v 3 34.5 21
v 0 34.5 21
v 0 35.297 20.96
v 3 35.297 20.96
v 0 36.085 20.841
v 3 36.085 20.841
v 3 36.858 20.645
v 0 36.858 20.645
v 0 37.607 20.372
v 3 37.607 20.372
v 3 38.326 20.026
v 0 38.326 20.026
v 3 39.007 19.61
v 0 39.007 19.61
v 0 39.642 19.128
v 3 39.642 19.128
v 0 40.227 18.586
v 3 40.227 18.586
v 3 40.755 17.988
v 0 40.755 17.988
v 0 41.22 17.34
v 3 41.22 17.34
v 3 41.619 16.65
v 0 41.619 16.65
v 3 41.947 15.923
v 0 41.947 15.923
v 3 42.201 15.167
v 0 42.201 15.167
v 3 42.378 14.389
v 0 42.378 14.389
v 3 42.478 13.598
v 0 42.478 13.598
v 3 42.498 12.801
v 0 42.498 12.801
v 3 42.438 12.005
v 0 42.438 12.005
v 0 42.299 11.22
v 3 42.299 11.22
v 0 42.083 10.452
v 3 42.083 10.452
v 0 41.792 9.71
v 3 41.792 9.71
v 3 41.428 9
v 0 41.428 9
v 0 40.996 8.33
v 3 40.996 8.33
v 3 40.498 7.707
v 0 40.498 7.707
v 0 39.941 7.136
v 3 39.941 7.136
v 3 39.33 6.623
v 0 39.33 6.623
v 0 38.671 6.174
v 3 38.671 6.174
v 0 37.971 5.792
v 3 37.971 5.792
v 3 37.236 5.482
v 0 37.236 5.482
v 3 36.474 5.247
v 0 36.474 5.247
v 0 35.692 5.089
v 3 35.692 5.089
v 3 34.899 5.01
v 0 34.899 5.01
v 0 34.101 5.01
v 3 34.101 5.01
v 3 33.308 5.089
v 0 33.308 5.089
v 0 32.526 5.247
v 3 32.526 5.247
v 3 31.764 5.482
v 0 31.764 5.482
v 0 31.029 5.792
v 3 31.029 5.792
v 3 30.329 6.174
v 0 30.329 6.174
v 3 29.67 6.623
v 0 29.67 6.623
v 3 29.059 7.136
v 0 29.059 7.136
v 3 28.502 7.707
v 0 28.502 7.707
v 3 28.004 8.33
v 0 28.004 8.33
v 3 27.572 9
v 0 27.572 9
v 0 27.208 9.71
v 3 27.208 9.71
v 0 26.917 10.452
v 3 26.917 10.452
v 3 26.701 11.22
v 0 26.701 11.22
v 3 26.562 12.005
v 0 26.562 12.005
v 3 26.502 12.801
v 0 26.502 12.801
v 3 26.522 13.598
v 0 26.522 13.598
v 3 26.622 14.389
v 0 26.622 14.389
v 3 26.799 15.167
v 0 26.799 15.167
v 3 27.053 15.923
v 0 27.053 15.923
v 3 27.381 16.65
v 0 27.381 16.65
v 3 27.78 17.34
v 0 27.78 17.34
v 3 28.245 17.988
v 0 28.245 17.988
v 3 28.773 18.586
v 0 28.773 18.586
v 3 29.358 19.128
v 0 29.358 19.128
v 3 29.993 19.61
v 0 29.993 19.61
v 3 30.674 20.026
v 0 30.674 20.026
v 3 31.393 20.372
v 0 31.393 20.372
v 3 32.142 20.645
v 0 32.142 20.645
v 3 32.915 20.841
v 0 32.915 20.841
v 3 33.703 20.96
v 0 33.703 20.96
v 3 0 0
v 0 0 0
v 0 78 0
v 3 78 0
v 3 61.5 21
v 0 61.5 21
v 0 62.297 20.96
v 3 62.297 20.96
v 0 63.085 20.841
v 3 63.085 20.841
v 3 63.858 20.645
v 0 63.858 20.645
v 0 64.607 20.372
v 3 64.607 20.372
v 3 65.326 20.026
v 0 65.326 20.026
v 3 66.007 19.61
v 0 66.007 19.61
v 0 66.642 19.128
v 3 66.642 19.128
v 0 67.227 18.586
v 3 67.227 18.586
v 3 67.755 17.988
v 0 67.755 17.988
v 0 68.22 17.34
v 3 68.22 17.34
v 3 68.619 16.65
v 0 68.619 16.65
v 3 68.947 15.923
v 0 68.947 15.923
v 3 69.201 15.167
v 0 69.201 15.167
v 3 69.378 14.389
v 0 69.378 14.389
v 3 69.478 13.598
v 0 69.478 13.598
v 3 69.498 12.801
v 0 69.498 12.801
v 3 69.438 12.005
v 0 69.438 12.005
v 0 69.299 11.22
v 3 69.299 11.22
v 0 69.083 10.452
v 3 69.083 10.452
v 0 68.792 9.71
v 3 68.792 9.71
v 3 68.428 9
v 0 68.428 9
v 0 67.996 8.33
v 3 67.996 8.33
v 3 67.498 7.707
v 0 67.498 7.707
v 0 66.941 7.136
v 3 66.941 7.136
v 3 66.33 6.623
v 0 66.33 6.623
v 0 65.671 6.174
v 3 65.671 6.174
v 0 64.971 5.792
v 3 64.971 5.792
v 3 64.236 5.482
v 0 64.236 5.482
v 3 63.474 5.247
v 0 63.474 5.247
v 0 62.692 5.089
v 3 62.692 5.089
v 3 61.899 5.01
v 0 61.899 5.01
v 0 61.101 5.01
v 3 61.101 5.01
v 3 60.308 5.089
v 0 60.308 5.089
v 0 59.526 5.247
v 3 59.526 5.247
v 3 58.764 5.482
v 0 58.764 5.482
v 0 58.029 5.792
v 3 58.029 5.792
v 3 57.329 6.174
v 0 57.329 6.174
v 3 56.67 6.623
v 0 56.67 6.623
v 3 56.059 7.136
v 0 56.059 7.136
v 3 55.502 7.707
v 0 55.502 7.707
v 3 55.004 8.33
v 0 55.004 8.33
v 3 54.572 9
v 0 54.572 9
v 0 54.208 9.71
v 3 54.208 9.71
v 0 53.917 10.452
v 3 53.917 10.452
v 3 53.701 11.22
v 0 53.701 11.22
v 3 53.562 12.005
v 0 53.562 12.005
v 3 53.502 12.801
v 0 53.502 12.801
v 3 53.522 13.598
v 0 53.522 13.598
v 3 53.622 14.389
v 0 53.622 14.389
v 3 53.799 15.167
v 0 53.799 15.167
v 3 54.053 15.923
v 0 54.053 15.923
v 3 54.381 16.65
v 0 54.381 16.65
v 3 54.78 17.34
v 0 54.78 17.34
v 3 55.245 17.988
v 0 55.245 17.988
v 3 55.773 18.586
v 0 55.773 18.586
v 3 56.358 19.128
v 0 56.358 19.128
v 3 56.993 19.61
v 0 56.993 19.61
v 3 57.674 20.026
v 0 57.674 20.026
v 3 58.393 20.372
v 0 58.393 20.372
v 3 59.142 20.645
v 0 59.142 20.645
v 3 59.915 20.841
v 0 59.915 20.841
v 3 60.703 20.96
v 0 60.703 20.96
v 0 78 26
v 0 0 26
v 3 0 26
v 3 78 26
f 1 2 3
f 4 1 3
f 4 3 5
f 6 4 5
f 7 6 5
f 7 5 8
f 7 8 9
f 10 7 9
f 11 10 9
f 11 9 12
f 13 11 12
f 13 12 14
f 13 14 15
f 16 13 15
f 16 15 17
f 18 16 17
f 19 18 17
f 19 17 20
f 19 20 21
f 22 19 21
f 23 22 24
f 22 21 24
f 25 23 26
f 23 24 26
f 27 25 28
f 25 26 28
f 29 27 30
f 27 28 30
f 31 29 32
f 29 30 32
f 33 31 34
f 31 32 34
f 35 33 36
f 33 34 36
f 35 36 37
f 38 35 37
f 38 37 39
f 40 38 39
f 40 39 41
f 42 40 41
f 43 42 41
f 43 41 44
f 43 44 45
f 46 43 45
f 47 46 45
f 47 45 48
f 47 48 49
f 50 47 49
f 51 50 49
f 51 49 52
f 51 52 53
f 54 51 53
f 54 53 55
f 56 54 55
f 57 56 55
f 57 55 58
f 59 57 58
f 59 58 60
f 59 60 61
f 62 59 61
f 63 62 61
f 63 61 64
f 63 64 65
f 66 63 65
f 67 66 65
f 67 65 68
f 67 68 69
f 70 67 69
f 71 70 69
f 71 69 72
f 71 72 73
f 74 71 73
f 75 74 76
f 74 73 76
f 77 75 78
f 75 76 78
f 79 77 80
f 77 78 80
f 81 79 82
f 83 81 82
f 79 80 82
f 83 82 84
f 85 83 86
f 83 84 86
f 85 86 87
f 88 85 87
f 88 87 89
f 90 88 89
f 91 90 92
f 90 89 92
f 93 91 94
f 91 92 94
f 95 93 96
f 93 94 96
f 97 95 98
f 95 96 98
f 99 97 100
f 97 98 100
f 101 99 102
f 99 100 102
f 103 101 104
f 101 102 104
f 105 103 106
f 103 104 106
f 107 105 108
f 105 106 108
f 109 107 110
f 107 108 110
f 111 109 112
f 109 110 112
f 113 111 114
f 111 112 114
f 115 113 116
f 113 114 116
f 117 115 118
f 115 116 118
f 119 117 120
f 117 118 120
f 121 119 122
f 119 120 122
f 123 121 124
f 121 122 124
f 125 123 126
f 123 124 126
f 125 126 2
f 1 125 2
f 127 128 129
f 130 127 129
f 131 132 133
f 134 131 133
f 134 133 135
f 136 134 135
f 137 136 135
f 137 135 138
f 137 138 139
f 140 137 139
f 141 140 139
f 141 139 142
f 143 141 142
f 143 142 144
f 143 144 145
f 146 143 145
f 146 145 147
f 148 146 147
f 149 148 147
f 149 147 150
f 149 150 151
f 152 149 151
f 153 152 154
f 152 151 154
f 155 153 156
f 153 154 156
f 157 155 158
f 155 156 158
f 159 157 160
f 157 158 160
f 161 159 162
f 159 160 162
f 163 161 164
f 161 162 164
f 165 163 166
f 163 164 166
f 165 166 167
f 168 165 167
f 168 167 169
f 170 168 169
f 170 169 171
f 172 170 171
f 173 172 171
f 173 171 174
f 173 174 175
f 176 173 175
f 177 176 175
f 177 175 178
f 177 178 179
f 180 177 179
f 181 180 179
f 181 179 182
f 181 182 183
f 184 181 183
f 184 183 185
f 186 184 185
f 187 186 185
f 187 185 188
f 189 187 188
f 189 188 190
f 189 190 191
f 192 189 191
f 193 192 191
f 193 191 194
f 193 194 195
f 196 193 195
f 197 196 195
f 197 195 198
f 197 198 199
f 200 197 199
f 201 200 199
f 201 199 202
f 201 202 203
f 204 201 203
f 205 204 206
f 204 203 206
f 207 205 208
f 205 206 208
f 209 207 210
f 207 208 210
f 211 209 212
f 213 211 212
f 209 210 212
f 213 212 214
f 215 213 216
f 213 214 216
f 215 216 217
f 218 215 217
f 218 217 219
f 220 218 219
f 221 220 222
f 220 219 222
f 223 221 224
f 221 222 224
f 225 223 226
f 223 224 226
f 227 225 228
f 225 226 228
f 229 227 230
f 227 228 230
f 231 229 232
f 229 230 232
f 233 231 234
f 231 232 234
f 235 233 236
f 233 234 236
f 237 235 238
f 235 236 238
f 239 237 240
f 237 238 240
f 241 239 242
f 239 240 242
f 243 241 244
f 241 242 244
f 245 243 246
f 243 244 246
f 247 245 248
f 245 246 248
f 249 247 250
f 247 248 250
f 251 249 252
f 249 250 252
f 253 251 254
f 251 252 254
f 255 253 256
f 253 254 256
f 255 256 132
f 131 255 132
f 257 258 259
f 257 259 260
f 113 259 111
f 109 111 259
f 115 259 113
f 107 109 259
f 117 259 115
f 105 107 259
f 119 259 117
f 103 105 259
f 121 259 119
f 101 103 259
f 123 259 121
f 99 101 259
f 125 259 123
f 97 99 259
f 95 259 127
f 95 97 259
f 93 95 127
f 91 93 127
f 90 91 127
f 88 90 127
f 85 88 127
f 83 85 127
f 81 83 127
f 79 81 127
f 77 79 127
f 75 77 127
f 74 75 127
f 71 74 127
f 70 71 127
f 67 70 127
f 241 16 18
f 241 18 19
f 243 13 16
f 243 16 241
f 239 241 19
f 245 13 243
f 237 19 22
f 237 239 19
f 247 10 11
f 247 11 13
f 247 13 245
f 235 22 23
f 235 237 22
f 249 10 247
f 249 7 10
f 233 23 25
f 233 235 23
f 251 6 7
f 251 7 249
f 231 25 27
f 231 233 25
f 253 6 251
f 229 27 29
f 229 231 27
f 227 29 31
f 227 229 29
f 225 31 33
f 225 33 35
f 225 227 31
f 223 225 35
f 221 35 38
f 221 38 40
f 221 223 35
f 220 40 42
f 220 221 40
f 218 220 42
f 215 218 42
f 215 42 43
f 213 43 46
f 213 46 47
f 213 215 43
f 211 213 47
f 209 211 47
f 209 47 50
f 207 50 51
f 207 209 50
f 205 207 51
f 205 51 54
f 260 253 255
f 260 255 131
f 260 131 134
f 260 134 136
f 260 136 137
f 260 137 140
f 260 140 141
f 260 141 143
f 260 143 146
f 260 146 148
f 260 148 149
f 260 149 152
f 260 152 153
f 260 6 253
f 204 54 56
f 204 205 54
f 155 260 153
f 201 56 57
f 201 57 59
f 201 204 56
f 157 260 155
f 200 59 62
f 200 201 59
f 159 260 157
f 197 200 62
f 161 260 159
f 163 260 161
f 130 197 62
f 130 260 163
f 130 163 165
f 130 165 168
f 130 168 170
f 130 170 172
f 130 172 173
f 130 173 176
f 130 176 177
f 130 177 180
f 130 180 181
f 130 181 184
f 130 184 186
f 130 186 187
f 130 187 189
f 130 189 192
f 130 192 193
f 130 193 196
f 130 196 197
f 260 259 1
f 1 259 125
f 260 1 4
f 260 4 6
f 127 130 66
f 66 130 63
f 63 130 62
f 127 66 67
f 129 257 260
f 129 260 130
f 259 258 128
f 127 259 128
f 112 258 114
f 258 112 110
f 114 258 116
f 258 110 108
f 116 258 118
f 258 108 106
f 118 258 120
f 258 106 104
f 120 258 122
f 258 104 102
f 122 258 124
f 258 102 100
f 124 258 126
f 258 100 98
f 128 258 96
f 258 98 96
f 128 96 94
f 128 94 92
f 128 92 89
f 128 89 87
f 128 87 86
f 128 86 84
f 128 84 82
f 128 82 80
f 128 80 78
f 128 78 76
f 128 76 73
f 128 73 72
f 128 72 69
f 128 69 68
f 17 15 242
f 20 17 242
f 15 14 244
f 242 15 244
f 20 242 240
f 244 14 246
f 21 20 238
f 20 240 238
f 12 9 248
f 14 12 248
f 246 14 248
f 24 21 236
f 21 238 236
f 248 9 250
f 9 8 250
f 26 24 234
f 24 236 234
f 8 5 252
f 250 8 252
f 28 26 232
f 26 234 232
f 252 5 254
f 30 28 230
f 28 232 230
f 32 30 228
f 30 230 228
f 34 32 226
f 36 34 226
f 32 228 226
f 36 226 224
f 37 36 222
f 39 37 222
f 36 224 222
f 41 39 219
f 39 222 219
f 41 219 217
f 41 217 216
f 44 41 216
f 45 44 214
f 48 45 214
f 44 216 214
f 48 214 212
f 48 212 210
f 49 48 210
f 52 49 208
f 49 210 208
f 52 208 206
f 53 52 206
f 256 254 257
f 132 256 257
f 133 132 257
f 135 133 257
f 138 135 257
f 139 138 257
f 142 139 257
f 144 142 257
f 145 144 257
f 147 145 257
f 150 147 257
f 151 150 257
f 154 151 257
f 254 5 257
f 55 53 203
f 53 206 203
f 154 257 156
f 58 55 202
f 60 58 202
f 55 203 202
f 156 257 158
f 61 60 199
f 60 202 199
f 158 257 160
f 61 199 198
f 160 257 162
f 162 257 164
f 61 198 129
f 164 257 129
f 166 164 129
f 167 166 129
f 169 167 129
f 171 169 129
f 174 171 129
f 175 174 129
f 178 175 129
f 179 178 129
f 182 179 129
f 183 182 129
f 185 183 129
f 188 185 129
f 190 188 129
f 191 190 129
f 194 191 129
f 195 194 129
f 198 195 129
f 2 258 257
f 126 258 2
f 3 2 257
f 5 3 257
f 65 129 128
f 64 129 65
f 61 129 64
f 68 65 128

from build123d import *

# Parameters (mm, degrees)
CROQUIS1_W              = 26
CROQUIS1_H              = 78
SALIENTE_EXTRUIR1_DEPTH = 3
CROQUIS2_R              = 8
CORTAR_EXTRUIR1_DEPTH   = 4


with BuildPart() as part:
    # Croquis1 → Saliente-Extruir1 (new body)
    with BuildSketch(Plane(origin=(0, 0, 0), x_dir=(0, 0, -1), z_dir=(1, 0, 0))):
        with Locations((-13, 39)):
            Rectangle(CROQUIS1_W, CROQUIS1_H)
    extrude(amount=SALIENTE_EXTRUIR1_DEPTH)

    # Croquis2 → Cortar-Extruir1 (cut, through all)
    with BuildSketch(Plane.ZY):
        with Locations((13, 61.5)):
            Circle(CROQUIS2_R)
        with Locations((13, 34.5)):
            Circle(CROQUIS2_R)
    extrude(amount=-CORTAR_EXTRUIR1_DEPTH, mode=Mode.SUBTRACT)


solid = part.part
